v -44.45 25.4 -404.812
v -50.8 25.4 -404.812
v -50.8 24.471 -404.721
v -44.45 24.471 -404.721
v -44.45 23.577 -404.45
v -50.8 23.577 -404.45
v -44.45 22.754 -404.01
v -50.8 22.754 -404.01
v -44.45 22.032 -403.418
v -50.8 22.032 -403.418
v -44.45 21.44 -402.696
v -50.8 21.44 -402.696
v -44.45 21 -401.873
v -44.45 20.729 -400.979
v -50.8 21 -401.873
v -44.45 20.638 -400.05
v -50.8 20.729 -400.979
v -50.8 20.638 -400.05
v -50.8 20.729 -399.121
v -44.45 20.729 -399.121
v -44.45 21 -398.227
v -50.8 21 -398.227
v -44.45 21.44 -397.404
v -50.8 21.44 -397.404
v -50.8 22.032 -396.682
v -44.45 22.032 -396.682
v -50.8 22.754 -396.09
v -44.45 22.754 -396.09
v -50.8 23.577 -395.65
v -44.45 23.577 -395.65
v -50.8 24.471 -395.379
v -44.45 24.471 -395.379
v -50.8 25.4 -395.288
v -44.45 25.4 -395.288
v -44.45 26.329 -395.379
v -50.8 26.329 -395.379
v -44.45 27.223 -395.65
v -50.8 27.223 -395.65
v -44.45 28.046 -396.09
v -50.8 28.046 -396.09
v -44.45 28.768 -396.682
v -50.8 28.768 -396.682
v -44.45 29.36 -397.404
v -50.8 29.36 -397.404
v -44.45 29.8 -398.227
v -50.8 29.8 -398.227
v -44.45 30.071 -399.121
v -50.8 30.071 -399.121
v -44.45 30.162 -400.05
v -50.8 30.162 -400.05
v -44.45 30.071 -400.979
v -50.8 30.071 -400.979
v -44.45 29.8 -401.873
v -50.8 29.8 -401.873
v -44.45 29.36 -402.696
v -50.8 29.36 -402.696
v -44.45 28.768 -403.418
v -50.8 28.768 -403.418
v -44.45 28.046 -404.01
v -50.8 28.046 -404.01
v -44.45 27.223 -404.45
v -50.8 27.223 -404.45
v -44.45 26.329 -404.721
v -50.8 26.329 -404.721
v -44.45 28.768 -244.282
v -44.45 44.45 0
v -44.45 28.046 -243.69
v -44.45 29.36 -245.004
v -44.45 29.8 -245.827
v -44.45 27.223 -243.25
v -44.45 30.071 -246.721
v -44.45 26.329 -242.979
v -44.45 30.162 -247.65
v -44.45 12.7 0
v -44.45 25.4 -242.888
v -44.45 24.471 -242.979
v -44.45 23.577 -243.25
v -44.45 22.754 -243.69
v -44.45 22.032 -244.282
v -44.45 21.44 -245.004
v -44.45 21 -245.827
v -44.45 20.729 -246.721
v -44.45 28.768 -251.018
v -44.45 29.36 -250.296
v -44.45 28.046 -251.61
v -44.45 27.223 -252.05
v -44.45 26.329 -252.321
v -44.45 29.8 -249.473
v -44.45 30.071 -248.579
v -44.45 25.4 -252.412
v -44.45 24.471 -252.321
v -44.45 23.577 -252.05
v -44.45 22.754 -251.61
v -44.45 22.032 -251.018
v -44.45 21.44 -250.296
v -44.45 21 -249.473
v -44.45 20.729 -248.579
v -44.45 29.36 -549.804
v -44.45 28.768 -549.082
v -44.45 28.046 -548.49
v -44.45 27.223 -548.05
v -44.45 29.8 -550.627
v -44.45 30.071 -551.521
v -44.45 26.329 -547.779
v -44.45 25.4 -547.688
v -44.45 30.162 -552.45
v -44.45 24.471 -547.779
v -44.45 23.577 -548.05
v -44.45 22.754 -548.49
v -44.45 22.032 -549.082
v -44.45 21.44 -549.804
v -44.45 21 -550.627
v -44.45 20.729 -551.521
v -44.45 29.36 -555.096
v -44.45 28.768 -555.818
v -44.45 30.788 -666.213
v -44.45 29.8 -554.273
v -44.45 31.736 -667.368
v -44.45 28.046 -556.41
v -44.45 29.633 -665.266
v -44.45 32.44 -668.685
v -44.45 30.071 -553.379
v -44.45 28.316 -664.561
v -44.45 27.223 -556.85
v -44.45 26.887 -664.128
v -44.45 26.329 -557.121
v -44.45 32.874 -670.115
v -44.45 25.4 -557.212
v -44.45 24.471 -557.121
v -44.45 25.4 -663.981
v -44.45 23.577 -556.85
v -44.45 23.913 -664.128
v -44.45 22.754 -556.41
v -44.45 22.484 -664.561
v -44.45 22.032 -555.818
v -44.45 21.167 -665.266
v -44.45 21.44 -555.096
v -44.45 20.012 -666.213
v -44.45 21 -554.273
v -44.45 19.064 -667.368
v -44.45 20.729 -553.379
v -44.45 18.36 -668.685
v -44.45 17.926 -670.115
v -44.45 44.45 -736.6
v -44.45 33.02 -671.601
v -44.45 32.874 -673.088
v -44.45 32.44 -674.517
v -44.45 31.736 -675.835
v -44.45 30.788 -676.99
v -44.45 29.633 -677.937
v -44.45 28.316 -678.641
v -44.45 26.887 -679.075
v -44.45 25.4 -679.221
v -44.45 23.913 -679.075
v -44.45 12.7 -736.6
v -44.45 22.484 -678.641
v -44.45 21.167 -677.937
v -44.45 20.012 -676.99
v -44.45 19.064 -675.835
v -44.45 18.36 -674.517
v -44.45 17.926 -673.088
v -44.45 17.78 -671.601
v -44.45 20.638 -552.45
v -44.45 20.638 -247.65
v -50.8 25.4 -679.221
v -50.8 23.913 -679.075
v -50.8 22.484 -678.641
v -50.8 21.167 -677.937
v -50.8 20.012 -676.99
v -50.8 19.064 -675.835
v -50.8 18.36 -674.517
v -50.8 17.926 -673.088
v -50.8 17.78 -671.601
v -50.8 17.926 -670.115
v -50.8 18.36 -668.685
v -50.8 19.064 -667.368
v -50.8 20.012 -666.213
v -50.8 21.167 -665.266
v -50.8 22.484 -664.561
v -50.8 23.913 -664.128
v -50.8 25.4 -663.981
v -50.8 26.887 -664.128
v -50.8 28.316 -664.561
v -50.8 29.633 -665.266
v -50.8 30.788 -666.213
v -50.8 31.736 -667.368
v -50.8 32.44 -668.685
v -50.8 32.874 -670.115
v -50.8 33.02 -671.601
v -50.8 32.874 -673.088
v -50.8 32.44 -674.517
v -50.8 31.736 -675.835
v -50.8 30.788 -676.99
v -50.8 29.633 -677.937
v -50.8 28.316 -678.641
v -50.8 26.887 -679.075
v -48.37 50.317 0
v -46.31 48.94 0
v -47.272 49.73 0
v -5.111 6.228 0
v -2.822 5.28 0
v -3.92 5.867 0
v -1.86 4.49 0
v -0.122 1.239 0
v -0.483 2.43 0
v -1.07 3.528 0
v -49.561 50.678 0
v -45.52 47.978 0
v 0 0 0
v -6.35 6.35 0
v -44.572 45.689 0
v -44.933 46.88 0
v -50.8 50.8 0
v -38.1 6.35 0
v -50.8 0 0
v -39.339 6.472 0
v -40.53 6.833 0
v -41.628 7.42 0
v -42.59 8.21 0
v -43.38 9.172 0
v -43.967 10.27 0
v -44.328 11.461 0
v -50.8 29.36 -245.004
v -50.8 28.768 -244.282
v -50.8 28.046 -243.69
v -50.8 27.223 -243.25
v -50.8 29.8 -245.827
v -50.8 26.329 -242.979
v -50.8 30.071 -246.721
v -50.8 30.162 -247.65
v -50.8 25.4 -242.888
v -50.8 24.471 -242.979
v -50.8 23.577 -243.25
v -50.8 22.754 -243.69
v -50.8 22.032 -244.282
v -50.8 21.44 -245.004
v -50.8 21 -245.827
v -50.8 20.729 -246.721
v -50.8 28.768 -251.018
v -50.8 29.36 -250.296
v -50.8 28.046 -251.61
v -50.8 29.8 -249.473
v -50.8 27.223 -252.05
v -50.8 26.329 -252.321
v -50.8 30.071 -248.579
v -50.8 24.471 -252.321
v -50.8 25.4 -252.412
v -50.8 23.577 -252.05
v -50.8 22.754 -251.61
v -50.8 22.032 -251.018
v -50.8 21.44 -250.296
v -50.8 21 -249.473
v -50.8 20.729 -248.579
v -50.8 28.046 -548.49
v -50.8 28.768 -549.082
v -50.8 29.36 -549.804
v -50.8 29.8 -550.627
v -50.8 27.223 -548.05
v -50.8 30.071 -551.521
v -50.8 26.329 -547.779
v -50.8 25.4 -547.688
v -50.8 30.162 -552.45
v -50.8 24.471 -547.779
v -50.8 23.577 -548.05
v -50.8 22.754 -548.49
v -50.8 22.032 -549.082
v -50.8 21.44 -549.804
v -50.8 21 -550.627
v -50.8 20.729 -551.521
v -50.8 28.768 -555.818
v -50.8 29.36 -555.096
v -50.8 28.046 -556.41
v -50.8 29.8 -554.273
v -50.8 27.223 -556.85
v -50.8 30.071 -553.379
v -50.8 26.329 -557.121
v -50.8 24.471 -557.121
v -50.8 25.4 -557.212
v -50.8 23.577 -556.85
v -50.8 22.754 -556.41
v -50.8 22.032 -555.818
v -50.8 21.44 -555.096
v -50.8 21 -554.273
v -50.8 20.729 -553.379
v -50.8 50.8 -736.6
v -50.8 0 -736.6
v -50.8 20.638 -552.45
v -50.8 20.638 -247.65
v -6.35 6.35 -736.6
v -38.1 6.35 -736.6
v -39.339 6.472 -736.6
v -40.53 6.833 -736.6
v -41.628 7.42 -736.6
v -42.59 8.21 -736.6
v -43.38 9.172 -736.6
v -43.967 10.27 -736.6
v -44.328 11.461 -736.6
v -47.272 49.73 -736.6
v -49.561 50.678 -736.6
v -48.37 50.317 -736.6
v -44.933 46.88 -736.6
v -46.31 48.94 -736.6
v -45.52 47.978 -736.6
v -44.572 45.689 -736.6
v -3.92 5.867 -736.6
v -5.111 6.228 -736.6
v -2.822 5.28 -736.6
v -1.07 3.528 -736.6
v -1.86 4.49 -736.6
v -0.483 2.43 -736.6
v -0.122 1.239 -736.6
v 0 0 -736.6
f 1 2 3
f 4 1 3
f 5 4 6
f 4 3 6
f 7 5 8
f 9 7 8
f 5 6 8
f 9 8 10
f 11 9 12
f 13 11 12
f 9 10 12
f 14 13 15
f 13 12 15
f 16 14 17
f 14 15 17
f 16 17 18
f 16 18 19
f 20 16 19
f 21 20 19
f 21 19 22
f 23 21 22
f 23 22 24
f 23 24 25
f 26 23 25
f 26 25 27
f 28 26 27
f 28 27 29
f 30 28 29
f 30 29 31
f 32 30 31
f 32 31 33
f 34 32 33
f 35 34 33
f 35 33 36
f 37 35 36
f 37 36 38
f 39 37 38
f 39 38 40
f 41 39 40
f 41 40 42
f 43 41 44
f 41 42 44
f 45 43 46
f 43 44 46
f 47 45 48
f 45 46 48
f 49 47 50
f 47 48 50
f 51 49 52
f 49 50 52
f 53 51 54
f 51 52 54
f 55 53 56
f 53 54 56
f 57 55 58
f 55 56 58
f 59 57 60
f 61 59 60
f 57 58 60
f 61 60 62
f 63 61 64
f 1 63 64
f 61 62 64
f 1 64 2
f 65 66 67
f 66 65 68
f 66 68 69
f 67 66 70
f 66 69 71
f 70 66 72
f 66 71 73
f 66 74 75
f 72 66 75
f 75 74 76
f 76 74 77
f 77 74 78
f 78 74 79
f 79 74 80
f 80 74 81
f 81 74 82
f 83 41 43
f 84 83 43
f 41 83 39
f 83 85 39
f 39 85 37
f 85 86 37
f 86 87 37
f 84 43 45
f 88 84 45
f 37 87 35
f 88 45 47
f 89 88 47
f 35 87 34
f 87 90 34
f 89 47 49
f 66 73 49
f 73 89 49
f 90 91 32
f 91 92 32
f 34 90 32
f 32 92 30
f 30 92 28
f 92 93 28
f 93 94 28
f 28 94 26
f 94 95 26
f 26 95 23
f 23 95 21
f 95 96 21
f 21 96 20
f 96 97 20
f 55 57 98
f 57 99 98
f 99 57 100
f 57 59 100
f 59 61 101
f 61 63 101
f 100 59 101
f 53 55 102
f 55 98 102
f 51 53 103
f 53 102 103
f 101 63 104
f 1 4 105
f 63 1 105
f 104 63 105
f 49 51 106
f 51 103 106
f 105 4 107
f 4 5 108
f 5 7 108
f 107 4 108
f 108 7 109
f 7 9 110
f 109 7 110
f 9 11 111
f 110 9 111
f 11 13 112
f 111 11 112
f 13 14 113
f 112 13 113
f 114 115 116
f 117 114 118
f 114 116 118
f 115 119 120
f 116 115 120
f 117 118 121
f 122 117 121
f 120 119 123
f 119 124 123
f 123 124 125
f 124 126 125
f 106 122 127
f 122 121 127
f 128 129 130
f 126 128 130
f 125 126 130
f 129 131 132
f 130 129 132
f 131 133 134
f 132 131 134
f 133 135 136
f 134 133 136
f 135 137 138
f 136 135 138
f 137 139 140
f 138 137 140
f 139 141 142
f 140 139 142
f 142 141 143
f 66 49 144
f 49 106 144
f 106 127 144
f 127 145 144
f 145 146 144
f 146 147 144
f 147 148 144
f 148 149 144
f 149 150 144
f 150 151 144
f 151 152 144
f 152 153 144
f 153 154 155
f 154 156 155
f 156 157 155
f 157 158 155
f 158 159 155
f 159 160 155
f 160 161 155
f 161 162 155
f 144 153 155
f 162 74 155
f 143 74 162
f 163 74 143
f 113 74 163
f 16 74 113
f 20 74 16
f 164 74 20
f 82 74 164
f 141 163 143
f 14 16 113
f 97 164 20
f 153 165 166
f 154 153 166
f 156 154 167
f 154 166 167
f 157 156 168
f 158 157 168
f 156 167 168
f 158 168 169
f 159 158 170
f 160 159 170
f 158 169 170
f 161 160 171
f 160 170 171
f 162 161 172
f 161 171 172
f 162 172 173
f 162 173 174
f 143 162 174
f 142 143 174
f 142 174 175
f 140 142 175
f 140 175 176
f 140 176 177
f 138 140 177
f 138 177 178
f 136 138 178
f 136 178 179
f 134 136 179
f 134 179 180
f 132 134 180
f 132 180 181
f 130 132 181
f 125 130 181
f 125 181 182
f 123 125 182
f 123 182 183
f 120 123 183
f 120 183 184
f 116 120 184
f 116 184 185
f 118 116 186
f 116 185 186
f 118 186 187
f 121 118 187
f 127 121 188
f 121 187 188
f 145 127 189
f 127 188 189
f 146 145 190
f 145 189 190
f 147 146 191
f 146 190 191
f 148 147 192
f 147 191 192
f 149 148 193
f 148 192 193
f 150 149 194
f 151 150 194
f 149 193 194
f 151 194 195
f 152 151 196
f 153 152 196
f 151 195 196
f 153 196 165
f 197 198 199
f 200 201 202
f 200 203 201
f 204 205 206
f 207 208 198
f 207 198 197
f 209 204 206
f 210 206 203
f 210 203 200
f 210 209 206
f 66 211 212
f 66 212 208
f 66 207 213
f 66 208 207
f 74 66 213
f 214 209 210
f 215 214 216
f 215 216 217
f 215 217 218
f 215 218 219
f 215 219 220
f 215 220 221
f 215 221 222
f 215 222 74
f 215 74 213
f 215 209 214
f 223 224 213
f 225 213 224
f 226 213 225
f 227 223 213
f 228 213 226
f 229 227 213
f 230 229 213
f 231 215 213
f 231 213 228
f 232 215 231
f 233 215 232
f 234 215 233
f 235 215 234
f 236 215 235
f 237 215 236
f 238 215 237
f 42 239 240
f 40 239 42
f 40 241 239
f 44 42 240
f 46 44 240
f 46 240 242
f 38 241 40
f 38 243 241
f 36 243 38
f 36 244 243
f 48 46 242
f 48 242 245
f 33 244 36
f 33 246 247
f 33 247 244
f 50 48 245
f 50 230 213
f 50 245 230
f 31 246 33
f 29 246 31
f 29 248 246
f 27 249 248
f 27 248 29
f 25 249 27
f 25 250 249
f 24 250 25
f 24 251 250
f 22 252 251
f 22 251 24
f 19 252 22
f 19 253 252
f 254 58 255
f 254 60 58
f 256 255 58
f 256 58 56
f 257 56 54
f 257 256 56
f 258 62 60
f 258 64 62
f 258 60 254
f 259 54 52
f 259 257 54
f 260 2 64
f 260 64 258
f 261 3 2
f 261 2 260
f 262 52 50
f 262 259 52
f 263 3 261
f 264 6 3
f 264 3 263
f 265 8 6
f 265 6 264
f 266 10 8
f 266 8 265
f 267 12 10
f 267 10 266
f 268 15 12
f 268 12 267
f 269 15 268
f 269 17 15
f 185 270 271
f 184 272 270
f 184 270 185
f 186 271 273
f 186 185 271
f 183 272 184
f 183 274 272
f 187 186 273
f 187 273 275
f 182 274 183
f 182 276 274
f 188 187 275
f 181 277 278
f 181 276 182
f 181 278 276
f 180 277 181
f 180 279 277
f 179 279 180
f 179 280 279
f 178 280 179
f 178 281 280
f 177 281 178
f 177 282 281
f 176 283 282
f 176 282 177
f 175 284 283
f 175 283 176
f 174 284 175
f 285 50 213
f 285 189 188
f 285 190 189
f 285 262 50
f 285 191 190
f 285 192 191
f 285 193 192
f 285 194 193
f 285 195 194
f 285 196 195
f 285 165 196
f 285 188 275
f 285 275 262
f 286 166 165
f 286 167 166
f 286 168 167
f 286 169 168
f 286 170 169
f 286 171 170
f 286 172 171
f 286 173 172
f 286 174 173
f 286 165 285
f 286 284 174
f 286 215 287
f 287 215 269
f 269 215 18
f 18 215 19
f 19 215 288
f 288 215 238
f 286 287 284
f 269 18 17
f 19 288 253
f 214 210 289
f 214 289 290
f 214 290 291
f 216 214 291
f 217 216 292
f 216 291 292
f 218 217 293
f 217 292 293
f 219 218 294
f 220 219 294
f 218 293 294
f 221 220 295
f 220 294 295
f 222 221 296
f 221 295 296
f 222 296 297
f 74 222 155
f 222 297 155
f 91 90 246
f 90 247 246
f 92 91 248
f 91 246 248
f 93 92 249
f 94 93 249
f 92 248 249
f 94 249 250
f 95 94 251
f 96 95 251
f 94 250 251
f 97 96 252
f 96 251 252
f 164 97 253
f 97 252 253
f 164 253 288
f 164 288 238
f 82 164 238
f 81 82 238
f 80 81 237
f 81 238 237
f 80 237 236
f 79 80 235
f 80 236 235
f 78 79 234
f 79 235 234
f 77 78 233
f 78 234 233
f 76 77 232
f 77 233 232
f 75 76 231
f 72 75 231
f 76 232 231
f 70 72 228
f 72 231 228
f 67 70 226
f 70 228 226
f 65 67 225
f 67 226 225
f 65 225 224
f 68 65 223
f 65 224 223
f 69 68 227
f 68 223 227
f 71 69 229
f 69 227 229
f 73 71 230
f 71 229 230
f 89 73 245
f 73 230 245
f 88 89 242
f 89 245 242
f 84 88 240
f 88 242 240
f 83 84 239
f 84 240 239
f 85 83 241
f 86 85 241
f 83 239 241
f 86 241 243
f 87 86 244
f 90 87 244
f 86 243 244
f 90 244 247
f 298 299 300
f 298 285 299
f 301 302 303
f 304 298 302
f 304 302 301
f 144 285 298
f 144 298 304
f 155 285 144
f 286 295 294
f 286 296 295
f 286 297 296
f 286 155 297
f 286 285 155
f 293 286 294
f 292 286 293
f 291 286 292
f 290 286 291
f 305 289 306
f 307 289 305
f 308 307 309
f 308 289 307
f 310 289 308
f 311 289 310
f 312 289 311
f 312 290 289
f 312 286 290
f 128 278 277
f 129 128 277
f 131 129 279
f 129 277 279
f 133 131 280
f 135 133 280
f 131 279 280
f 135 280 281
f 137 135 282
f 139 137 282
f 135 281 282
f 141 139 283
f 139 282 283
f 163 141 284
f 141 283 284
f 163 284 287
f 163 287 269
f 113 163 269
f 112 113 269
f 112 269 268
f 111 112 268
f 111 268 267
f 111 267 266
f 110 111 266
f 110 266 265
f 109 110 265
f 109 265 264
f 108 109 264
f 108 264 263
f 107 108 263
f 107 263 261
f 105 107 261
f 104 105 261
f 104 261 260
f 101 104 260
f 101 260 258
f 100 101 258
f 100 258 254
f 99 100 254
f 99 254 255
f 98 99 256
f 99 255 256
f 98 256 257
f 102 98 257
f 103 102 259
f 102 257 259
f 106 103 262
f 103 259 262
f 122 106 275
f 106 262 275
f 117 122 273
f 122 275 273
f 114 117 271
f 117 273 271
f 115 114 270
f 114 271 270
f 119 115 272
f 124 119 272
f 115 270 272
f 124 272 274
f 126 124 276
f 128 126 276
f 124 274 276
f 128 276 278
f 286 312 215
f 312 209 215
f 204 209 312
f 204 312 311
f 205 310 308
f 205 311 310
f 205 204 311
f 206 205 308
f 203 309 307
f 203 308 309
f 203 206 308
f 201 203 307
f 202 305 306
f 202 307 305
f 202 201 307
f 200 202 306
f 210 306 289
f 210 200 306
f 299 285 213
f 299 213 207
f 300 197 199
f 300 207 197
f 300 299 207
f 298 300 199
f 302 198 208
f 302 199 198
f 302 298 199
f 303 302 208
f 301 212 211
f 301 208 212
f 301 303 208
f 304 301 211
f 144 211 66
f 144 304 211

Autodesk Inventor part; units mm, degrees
ref_plane "YZ Plane" through (0, 0, 0) normal (1, 0, 0) x (0, 1, 0)
ref_plane "XZ Plane" through (0, 0, 0) normal (0, 1, 0) x (-1, 0, 0)
ref_plane "XY Plane" through (0, 0, 0) normal (0, 0, 1) x (1, 0, 0)
sketch "Sketch1" plane through (0, 0, 0) normal (0, 1, 0) x (-1, 0, 0)
  line L0 (0, 0) -> (50.8, 0)
  line L1 (50.8, 0) -> (50.8, -736.6)
  line L2 (50.8, -736.6) -> (0, -736.6)
  line L3 (0, -736.6) -> (0, 0)
  dimension "d0" = 50.8
  dimension "d1" = 736.6
extrude "Extrusion1" add sketch "Sketch1" along normal blind 6.35
sketch "Sketch2" plane through (0, 6.35, 0) normal (0, 1, 0) x (1, 0, 0)
  line L0 (-50.8, 0) -> (-44.45, 0)
  line L1 (-50.8, 0) -> (0, 0) projected
  line L2 (-44.45, 0) -> (-44.45, 736.6)
  line L3 (0, 736.6) -> (-50.8, 736.6) projected
  line L4 (-44.45, 736.6) -> (-50.8, 736.6)
  line L5 (-50.8, 736.6) -> (-50.8, 0)
  line L6 (-50.8, 0) -> (-44.45, 0)
  dimension "d4" = 6.35
  dimension "d5" = 736.6
  dimension "d6" = 736.6
extrude "Extrusion2" add sketch "Sketch2" along normal blind 44.45
fillet "Fillet1" radius 6.35 1 edges at (-44.45, 6.35, -368.3)
fillet "Fillet2" radius 6.35 1 edges at (0, 6.35, -368.3)
fillet "Fillet3" radius 6.35 1 edges at (-44.45, 50.8, -368.3)
hole "Hole1" at (-44.45, 25.4, -247.65) direction (-1, 0, 0) diameter 9.525 end through all
pattern_linear "Rectangular Pattern1" count 3 spacing 152.4 along (0, 0, -1) of "Hole1"
hole "Hole2" at (-44.45, 25.4, -671.6014) direction (-1, 0, 0) diameter 15.24 end through all
properties part number "2x2 quarter in angle aluminum"
